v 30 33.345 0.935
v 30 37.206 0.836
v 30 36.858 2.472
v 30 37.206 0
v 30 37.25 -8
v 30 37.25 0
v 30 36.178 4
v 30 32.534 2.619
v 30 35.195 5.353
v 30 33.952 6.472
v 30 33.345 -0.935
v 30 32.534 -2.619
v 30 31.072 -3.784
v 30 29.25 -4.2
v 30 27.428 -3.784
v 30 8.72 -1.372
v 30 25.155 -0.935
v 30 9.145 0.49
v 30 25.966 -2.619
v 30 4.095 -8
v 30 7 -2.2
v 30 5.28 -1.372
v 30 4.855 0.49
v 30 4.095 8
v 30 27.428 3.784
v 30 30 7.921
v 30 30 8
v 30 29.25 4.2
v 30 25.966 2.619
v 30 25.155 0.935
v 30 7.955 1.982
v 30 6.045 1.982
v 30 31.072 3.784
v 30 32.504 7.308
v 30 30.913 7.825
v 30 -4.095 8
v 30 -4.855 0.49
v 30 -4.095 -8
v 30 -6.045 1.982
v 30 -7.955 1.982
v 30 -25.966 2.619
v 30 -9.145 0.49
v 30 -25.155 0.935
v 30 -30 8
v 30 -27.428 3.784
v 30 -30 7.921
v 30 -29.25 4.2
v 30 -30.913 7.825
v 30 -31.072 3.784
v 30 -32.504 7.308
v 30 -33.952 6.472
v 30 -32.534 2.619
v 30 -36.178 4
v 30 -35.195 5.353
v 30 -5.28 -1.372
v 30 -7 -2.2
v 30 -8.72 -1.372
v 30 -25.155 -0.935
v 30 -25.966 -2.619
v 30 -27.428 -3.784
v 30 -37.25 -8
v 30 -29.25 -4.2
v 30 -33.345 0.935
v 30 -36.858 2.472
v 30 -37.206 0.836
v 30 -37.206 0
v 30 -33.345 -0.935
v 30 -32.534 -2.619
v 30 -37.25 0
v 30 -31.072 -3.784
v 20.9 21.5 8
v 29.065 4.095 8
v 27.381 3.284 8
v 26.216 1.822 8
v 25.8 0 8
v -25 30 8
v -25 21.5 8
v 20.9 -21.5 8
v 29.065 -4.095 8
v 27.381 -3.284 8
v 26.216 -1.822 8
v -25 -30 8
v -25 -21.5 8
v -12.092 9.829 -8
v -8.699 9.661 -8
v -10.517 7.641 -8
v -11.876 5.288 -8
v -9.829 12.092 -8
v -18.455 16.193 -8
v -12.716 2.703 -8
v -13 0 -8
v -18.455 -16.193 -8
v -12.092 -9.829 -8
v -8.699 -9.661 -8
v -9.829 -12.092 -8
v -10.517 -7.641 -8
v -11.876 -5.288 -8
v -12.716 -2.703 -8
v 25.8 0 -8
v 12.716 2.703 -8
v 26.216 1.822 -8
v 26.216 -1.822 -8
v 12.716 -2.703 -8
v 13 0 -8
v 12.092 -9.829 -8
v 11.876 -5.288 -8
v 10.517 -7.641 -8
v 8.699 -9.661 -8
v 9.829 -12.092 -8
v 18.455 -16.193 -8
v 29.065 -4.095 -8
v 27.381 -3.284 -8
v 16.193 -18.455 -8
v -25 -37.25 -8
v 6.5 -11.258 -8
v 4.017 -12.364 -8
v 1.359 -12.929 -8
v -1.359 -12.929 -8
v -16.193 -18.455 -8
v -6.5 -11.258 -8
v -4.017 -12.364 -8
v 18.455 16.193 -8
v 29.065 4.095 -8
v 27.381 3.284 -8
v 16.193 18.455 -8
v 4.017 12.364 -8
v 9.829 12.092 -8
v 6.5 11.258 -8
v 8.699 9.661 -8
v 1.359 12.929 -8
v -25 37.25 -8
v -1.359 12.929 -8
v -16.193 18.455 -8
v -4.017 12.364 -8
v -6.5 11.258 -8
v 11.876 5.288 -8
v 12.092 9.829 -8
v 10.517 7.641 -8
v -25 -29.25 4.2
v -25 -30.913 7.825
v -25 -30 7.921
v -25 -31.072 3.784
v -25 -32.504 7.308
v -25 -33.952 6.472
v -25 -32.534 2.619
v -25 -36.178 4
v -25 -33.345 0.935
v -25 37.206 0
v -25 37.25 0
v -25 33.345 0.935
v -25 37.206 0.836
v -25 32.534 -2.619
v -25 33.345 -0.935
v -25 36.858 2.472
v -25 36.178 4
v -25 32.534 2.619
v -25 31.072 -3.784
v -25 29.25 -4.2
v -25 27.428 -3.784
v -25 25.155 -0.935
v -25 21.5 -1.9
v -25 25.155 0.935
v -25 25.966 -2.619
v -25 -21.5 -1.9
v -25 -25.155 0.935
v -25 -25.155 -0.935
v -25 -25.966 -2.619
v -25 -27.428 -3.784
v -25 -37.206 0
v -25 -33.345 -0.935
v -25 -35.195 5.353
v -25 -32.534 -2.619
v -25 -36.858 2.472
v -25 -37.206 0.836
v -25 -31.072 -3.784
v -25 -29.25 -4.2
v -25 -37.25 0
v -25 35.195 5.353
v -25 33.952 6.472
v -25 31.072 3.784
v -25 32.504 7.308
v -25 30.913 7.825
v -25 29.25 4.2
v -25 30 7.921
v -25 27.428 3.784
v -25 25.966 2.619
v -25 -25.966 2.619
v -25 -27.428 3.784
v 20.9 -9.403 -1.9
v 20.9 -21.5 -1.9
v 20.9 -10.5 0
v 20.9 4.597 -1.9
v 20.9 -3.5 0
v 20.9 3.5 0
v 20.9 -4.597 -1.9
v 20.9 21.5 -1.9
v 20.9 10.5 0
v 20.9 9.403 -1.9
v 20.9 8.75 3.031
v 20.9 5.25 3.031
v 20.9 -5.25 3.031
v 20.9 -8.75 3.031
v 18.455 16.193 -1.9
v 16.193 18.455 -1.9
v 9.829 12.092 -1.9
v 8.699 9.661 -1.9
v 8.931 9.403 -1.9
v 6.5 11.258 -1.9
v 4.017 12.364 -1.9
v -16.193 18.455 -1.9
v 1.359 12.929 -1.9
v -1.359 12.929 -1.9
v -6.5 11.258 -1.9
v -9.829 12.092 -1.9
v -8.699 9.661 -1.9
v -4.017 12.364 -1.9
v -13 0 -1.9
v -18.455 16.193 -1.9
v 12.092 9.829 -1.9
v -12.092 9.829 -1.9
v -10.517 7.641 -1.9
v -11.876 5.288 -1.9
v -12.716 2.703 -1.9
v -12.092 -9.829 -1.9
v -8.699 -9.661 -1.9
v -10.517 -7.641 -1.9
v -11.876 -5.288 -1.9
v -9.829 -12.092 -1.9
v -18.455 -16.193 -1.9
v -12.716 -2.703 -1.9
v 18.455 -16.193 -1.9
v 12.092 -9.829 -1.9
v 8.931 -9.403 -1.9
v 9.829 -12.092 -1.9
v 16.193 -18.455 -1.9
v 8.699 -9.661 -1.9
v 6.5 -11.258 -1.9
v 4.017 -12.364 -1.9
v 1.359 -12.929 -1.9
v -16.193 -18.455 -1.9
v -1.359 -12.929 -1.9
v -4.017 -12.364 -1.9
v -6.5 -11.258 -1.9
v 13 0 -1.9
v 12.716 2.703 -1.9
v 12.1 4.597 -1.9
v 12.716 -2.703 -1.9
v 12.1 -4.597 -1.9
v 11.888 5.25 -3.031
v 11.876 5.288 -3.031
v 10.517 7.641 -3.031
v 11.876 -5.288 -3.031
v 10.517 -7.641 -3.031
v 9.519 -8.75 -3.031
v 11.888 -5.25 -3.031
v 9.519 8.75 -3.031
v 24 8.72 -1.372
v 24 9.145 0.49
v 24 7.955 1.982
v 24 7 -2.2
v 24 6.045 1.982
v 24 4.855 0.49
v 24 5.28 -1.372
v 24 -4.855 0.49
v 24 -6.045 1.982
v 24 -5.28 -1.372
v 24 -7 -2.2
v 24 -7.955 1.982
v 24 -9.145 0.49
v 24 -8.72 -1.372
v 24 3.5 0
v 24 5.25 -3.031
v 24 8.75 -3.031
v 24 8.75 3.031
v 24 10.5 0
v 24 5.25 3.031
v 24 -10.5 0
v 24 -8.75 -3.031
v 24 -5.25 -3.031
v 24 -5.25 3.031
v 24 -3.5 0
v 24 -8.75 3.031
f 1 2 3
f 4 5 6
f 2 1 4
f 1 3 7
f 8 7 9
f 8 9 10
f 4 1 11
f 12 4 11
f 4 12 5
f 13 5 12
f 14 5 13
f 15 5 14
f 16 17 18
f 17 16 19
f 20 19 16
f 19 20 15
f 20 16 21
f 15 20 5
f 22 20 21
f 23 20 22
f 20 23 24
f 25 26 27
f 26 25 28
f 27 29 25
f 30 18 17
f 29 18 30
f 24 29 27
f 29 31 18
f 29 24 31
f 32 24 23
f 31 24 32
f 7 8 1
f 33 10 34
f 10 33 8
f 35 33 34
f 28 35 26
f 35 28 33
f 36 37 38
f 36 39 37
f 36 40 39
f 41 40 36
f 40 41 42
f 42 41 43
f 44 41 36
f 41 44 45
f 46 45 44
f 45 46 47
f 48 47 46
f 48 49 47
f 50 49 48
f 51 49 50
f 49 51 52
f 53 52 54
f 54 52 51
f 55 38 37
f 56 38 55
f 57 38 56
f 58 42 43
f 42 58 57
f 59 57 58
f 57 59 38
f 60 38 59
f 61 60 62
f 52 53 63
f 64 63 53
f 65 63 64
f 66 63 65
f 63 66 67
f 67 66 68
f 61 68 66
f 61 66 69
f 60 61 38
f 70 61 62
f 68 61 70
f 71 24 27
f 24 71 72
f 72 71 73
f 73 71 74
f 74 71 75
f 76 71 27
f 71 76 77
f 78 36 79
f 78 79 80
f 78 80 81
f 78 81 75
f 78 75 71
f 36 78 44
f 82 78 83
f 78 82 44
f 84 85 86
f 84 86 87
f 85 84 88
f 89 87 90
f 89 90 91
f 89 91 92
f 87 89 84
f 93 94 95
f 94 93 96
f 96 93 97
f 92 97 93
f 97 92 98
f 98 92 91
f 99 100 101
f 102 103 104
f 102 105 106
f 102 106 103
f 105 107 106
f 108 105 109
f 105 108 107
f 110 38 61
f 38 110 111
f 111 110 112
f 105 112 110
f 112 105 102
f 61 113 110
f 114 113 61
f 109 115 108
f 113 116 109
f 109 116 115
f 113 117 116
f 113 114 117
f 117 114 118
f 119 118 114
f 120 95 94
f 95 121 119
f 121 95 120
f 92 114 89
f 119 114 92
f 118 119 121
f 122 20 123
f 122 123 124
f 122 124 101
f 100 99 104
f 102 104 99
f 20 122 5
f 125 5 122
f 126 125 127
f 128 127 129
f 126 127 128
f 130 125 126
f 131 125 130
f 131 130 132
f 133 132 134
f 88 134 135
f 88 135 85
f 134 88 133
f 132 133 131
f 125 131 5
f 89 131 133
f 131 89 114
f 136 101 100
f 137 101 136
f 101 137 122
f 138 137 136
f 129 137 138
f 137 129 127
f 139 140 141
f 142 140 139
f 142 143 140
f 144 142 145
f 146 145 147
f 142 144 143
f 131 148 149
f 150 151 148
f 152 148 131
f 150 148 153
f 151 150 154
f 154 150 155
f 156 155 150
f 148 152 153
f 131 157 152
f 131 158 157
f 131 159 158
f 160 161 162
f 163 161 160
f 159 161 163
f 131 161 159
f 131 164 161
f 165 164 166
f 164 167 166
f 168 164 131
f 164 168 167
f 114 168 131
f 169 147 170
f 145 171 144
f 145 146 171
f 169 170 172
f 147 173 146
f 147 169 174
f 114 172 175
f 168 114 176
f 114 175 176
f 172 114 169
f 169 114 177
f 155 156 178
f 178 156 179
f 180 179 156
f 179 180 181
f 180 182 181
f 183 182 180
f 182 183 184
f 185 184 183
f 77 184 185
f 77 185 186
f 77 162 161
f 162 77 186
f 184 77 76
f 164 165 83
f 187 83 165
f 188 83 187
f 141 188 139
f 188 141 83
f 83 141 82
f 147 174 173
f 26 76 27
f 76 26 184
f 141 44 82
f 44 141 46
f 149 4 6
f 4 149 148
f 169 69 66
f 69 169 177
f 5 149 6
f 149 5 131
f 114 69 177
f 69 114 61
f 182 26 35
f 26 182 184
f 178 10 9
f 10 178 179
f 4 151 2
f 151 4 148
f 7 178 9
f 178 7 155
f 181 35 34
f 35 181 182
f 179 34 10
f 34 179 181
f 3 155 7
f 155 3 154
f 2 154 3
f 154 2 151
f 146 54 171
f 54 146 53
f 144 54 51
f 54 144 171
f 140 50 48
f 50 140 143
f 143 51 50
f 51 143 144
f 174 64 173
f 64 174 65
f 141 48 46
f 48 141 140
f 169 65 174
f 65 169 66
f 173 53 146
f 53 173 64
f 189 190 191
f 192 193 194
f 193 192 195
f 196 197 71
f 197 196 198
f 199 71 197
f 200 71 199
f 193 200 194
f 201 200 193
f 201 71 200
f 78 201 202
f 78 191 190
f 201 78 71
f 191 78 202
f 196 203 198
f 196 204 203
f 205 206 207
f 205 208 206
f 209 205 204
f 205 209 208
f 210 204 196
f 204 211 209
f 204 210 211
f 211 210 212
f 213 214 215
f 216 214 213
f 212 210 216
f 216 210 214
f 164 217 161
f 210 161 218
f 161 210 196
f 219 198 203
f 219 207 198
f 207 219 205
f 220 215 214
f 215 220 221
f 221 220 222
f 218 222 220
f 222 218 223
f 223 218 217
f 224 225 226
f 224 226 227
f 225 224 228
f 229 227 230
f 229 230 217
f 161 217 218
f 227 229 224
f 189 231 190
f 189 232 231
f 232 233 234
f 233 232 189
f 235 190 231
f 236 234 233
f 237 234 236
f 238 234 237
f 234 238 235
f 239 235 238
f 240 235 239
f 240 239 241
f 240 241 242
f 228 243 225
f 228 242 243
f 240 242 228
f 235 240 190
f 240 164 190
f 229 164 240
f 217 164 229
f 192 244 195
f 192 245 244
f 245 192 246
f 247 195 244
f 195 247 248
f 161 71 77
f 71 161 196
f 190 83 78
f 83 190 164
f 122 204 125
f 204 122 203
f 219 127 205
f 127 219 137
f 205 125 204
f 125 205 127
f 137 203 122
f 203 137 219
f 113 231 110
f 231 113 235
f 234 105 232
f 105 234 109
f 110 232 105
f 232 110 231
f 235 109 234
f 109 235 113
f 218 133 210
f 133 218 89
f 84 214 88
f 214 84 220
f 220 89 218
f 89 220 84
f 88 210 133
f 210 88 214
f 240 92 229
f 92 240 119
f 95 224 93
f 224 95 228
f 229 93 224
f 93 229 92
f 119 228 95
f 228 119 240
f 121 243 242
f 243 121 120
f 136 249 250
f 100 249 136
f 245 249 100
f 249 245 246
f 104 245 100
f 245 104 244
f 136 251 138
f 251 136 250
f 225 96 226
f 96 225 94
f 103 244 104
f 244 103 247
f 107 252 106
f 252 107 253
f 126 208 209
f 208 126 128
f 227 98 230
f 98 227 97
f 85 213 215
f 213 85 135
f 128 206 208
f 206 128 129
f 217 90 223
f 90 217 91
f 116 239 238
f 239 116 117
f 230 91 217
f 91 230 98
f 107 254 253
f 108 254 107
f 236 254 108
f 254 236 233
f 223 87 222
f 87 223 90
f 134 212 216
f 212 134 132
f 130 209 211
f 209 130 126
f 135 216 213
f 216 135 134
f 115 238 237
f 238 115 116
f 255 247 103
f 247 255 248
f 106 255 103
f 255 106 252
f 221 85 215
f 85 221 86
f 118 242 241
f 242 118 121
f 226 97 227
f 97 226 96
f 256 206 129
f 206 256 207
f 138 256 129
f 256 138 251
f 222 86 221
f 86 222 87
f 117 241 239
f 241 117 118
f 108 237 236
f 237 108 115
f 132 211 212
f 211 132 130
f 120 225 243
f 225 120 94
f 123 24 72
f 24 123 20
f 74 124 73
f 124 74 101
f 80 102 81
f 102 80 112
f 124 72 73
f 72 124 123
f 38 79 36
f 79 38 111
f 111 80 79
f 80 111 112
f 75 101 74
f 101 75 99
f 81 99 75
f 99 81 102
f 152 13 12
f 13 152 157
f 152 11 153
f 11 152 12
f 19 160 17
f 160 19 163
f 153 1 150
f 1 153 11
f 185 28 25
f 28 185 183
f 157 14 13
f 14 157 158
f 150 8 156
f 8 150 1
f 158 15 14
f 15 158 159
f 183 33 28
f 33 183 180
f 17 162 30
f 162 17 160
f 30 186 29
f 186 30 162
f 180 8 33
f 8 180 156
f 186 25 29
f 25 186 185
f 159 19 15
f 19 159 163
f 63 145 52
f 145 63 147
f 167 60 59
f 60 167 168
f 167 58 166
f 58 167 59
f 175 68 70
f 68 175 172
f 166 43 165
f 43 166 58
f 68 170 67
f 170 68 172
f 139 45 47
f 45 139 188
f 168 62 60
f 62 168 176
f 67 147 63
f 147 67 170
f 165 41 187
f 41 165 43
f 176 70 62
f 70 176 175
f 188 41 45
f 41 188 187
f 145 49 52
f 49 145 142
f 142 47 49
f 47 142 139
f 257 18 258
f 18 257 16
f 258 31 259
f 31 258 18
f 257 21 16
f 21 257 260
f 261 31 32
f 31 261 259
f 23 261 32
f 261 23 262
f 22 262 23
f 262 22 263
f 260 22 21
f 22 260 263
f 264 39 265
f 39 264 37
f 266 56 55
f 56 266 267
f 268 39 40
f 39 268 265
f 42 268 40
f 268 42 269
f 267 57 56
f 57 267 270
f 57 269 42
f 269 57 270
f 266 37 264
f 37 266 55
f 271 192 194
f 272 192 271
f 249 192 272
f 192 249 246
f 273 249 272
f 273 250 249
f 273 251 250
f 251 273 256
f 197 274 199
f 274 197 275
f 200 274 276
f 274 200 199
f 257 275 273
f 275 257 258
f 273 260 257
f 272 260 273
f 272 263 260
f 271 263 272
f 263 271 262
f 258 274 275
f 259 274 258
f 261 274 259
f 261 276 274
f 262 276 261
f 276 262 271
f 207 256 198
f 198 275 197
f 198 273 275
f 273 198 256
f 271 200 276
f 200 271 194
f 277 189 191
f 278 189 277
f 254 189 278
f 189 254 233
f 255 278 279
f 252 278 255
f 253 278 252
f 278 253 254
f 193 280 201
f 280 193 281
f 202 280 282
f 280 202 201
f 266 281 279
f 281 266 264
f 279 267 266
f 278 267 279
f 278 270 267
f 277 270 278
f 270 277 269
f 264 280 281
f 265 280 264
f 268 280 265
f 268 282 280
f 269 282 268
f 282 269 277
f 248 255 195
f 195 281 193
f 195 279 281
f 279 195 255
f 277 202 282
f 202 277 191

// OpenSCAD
// file: configuration.scad
// PRUSA Mendel  
// Configuration file
// GNU GPL v2
// Josef Průša
// josefprusa@me.com
// prusadjs.cz
// http://www.reprap.org/wiki/Prusa_Mendel
// http://github.com/prusajr/PrusaMendel

// PLEASE SELECT ONE OF THE CONFIGURATIONS BELOW
// BY UN-COMMENTING IT

variant=0; //0 for metric
//variant=1; //1 for SAE
if(variant==0){
echo("variant: metric");
}else if(variant==1){
echo("variant: sae");
} else{
echo("WARNING: INVALID CONFIGURATION");
}


vars=[
//[m8_dia, m8_nut, m4_dia, m4_nut, m3_dia, m3_nut, bush_dia, mot_shaft, bush_rod, bush_outerdia, bush_length]
[8.4,16.4,5,9,4.4,7,11,5.3,8,16,11],//metric
[9,16.4,5.5,10,5.5,10,11.5,5.3,7.9375,16,11]//SAE
];

//BUSHING TYPE Can generate three versions
// 1 - regular old ones
// 2 - helical ones
// 3 - holders for brass or any other bought bushings
bushing_type = 2;

//Round corner diameter
round_corner_diameter = 8;

//Thin wall size
layer_height = 0.4;
perimeter_width_over_thicknes = 1.6;
infill_widht_over_thickness = 1.55;
thin_wall = 2*(perimeter_width_over_thicknes*layer_height+infill_widht_over_thickness*layer_height);
if(thin_wall<2){
	echo("Check thin wall size, its below 2mm!");
}
echo(thin_wall);

//DO NOT TOUCH THIS SECTION!
m8_diameter = vars[variant][0];
m8_nut_diameter = vars[variant][1];
m4_diameter = vars[variant][2];
m4_nut_diameter = vars[variant][3];
m3_diameter = vars[variant][4];
m3_nut_diameter = vars[variant][5];
bushing_diameter = vars[variant][6];
motor_shaft=vars[variant][7];
bushing_rodsize = vars[variant][8];
bushing_outerDiameter = vars[variant][9];
bushing_lenght = vars[variant][10];


// MINI-HUXLEY VERSION (TODO, just place holder)
// include <configuration-huxley.scad>

// MEGA VERSION (TODO, just place holder)
// include <configuration-mega.scad>


// Some basic functions, probably should be somewhere else
module roundcorner(diameter){
	difference(){
		cube(size = [diameter,diameter,99], center = false);
		translate(v = [diameter, diameter, 0]) cylinder(h = 100, r=diameter, center=true);
	}
}
// main file
// PRUSA Mendel  
// Z motor mount
// Used for mounting Z motors
// GNU GPL v2
// Josef Průša
// josefprusa@me.com
// prusadjs.cz
// http://www.reprap.org/wiki/Prusa_Mendel
// http://github.com/prusajr/PrusaMendel
include <configuration.scad>

/**
 *@name Z motor mount
 *@using 2 m3x25
 *@using 2 m3xnut
 *@using 2 m3xwasher
 *@using 2 m8nut
 *@using 2 m8washer
 */
module zmotormount(){
difference(){
union(){
translate(v=[2.5,0,0]) cube(size = [55,60,16], center = true);
translate(v=[2.5,0,-4]) cube(size = [55,74.5,8], center = true);
translate(v=[-25,29.25,0]) rotate(a=[0,90,0]) cylinder(h = 55, r=8, $fn=30);
translate(v=[-25,-29.25,0]) rotate(a=[0,90,0]) cylinder(h = 55, r=8, $fn=30);
}
translate(v=[-2.1,0,3.1]) cube(size = [46,43,10], center = true);

// Nema 17
rotate ([0,0,45]) translate([20,0,0]) cube(size = [9,3.2,25], center = true);
rotate ([0,0,-45]) translate([20,0,0]) cube(size = [9,3.2,25], center = true);
rotate ([0,0,135]) translate([20,0,0]) cube(size = [9,3.2,25], center = true);
rotate ([0,0,-135]) translate([20,0,0]) cube(size = [9,3.2,25], center = true);
translate(v=[0,0,-10])cylinder(h = 20, r=13);

translate(v=[30,0,-10]) cylinder(h = 20, r=4.2);
translate(v=[-26,29.25,0]) rotate(a=[0,90,0]) cylinder(h = 58, r=m8_diameter/2);
translate(v=[-26,-29.25,0]) rotate(a=[0,90,0]) cylinder(h = 58, r=m8_diameter/2);


translate(v=[16,7,0]) rotate(a=[0,90,0]) cylinder(h = 15, r=m3_diameter/2);
translate(v=[16,-7,0]) rotate(a=[0,90,0]) cylinder(h = 15, r=m3_diameter/2);
translate(v=[0,7,0]) rotate(a=[0,90,0]) rotate(a=[0,0,30]) cylinder(h = 24, r=m3_nut_diameter/2,$fn =6);
translate(v=[0,-7,0]) rotate(a=[0,90,0]) rotate(a=[0,0,30]) cylinder(h = 24, r=m3_nut_diameter/2, $fn=6);

}
}
zmotormount();
